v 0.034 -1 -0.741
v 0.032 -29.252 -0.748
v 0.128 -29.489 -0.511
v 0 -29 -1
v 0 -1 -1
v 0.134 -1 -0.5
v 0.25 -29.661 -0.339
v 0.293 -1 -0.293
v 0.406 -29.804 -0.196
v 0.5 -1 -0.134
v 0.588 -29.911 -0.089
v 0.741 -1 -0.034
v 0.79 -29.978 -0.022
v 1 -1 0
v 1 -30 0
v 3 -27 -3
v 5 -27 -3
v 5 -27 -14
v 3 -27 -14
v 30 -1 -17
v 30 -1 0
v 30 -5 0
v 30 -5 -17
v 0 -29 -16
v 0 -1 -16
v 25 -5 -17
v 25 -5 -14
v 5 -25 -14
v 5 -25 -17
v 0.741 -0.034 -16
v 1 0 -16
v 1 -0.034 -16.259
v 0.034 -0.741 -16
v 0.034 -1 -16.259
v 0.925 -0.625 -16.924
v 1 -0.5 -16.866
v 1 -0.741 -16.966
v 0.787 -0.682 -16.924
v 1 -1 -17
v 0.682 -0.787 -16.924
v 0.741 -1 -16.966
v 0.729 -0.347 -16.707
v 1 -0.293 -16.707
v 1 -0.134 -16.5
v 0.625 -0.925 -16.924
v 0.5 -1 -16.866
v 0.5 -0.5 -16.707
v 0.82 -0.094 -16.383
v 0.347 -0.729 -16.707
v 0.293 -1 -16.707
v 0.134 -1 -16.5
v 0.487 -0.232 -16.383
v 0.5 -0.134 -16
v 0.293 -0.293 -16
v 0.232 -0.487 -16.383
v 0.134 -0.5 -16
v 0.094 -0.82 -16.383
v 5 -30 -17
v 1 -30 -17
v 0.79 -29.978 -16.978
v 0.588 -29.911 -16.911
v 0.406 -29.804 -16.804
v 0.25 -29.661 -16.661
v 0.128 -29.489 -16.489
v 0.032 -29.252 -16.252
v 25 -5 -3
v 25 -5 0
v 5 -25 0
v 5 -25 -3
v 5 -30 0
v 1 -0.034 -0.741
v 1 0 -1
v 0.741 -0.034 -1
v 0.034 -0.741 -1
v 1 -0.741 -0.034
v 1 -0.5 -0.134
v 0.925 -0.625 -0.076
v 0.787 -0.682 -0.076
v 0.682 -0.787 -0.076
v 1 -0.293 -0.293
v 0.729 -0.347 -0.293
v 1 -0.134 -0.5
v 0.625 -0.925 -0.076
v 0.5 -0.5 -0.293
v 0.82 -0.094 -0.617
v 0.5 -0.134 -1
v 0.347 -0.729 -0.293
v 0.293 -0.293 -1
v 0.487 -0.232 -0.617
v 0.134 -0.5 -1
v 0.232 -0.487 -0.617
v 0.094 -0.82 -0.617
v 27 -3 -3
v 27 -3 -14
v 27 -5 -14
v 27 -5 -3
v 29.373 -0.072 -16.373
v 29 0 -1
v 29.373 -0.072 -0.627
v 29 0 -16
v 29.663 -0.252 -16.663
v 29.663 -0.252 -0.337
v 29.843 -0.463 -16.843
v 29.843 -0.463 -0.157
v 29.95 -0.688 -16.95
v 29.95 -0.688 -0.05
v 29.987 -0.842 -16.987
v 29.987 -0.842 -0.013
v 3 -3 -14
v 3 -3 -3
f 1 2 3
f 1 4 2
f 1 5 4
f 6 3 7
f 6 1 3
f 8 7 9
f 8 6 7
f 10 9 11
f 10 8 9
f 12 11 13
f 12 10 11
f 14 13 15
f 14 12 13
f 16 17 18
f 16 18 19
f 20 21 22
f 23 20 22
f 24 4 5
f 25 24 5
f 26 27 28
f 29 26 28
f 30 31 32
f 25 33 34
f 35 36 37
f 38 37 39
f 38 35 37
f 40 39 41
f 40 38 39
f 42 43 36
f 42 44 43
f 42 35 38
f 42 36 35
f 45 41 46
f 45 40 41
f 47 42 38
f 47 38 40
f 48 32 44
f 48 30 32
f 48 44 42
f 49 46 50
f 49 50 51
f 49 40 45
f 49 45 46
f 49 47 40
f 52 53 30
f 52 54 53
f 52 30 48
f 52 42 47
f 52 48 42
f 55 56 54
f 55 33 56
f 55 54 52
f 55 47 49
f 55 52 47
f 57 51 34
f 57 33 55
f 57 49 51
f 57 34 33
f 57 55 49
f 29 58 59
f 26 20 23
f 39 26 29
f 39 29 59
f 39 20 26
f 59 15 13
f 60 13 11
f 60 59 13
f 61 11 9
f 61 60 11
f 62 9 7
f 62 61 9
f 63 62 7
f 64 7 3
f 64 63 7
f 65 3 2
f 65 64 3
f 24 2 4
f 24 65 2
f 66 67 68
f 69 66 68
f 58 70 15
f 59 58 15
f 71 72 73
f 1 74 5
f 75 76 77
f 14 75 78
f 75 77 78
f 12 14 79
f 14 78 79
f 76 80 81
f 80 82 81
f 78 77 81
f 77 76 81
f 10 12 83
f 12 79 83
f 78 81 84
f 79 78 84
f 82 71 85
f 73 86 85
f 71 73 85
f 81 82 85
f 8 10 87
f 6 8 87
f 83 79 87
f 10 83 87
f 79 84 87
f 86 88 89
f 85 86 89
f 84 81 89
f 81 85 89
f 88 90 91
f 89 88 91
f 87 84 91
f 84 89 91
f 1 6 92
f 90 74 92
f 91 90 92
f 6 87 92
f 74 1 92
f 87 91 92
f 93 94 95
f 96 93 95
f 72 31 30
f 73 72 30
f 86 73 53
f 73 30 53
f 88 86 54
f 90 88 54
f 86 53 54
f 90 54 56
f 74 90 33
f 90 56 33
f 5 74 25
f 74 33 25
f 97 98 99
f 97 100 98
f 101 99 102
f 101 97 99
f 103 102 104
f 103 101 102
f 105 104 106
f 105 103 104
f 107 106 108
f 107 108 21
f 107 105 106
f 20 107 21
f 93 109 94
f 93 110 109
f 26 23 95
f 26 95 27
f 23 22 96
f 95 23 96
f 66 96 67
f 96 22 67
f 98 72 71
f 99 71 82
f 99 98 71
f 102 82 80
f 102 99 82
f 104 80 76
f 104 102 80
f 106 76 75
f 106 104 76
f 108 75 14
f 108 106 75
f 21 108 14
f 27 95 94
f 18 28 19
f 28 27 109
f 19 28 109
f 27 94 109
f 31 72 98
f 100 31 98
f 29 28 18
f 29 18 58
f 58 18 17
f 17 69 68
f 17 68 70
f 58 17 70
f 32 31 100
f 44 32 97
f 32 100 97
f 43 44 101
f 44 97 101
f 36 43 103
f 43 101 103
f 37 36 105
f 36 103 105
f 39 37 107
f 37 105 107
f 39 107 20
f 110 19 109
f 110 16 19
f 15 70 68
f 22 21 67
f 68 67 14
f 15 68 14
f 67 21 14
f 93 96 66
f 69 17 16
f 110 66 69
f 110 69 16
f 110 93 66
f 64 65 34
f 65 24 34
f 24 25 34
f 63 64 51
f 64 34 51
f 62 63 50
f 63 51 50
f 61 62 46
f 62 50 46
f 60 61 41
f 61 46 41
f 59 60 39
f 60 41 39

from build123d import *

# Parameters (mm, degrees)
BOSS_EXTRUDE1_DEPTH = 17
FILLET1_R           = 1
SHELL1_T            = -3


with BuildPart() as part:
    # Sketch1 → Boss-Extrude1 (new body)
    with BuildSketch(Plane.XY):
        Polygon((0, 0), (30, 0), (30, -5), (25, -5), (5, -25), (5, -30), (0, -30), align=None)
    extrude(amount=-BOSS_EXTRUDE1_DEPTH)

    # Fillet1
    fillet1_edges = [part.edges().sort_by_distance(p)[0] for p in [
        (0, 0, -8.5),
        (30, 0, -8.5),
        (0, -30, -8.5),
        (15, 0, -17),
        (0, -15, -17),
        (15, 0, 0),
        (0, -15, 0),
    ]]
    fillet(fillet1_edges, radius=FILLET1_R)

    # Shell1
    shell1_openings = [part.faces().sort_by_distance(p)[0] for p in [
        (27.5, -5, -8.5),
        (15, -15, -8.5),
        (5, -27.5, -8.5),
    ]]
    offset(amount=SHELL1_T, openings=shell1_openings)


solid = part.part
